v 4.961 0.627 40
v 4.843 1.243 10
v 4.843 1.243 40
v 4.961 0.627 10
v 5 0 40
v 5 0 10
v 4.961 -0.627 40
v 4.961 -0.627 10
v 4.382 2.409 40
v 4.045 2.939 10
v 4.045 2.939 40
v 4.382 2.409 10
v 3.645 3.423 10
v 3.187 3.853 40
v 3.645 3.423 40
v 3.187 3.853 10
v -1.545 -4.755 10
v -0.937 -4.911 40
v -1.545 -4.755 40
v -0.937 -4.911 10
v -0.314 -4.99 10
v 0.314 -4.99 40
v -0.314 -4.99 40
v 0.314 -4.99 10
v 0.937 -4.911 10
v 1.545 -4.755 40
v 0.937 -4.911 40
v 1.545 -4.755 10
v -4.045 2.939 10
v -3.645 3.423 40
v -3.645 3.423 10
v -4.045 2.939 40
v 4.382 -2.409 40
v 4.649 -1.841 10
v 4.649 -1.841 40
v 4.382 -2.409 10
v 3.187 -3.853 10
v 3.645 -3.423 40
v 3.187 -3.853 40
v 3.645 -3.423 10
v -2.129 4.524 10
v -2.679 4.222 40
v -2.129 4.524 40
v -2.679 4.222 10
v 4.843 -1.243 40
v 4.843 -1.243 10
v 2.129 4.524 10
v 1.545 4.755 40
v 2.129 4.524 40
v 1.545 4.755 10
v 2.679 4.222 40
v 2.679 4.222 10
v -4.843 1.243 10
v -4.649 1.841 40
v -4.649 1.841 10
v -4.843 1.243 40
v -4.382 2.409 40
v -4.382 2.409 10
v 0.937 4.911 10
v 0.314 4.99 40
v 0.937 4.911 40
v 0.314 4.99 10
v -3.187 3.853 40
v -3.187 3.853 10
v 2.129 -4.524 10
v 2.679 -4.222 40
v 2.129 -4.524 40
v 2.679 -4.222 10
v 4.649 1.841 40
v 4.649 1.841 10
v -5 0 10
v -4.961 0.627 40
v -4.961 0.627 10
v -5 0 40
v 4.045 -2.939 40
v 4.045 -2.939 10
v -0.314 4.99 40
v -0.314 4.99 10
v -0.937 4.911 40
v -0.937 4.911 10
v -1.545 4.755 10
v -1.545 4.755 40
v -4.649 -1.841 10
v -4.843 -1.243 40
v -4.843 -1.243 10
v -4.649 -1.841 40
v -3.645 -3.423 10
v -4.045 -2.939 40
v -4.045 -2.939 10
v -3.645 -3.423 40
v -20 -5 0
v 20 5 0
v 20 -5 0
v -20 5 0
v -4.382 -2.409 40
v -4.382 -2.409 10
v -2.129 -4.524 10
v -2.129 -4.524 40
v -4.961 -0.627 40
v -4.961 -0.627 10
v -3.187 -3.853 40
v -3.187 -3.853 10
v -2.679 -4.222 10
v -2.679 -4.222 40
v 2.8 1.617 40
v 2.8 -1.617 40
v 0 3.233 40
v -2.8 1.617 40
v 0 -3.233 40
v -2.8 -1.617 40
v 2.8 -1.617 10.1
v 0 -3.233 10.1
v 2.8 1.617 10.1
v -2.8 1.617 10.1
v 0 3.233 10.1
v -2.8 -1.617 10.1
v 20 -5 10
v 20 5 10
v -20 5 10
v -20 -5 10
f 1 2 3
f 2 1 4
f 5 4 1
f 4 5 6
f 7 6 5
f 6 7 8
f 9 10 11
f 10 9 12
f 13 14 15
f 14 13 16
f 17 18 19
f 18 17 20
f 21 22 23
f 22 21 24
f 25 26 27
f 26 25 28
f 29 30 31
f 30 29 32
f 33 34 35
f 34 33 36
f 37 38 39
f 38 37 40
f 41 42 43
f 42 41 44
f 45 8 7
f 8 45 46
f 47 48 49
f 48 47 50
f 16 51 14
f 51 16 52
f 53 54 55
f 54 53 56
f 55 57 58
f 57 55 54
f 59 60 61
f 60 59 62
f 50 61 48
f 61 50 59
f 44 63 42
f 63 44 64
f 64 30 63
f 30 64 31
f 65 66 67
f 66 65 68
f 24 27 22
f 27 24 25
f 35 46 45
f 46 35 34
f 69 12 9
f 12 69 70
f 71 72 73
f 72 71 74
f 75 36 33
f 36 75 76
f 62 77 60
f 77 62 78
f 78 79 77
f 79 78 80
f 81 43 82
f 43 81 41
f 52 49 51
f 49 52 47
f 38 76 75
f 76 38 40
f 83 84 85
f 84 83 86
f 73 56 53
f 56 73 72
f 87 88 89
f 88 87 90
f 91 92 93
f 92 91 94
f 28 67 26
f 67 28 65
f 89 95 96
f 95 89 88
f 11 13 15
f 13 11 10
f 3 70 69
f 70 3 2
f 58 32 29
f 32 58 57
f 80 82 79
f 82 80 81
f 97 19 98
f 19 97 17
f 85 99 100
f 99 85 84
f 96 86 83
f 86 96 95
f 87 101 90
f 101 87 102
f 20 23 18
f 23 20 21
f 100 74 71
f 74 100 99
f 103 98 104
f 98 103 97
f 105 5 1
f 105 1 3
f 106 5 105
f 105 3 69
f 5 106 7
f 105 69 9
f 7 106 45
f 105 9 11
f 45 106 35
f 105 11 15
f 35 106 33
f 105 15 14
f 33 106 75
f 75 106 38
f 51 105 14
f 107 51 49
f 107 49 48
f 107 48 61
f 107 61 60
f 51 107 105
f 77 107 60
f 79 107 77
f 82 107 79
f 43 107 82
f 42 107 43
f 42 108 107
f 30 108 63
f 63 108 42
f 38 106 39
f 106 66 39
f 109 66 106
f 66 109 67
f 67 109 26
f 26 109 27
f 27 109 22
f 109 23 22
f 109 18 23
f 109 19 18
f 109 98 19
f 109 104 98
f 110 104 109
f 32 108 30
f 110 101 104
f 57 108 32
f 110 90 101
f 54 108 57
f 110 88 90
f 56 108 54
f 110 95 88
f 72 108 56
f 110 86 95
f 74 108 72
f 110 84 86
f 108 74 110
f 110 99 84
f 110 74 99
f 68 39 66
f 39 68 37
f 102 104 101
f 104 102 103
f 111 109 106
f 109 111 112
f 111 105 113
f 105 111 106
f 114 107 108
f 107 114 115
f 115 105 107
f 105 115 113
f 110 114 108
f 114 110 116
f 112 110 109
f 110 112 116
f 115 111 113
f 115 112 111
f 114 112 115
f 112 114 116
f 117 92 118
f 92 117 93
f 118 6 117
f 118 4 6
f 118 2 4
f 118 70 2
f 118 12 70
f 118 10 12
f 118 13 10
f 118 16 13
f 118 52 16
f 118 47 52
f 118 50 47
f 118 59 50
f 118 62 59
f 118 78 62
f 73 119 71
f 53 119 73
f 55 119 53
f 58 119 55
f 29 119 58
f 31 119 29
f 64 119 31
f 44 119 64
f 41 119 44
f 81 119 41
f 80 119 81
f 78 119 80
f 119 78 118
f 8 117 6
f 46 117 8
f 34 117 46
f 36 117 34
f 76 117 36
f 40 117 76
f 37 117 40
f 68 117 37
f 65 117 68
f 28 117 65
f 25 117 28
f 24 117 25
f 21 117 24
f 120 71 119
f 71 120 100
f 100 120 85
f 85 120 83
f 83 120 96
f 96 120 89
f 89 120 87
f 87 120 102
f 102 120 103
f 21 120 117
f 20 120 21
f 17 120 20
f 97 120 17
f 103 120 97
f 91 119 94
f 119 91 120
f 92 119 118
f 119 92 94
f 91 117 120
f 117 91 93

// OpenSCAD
outer = 10;
inner = 5.5 + 0.1;
ratio = 2 / sqrt(3);
height = 40;

translate([-height / 2, -outer / 2, 0])
    cube([height, outer, 10]);

difference() {
    cylinder(h=height, r=outer/2, $fn = 50);
    translate([0, 0, height - 30 + 0.1])
        rotate([0, 0, 30])
            cylinder(h=30, r=ratio * inner/2, $fn=6);
}
